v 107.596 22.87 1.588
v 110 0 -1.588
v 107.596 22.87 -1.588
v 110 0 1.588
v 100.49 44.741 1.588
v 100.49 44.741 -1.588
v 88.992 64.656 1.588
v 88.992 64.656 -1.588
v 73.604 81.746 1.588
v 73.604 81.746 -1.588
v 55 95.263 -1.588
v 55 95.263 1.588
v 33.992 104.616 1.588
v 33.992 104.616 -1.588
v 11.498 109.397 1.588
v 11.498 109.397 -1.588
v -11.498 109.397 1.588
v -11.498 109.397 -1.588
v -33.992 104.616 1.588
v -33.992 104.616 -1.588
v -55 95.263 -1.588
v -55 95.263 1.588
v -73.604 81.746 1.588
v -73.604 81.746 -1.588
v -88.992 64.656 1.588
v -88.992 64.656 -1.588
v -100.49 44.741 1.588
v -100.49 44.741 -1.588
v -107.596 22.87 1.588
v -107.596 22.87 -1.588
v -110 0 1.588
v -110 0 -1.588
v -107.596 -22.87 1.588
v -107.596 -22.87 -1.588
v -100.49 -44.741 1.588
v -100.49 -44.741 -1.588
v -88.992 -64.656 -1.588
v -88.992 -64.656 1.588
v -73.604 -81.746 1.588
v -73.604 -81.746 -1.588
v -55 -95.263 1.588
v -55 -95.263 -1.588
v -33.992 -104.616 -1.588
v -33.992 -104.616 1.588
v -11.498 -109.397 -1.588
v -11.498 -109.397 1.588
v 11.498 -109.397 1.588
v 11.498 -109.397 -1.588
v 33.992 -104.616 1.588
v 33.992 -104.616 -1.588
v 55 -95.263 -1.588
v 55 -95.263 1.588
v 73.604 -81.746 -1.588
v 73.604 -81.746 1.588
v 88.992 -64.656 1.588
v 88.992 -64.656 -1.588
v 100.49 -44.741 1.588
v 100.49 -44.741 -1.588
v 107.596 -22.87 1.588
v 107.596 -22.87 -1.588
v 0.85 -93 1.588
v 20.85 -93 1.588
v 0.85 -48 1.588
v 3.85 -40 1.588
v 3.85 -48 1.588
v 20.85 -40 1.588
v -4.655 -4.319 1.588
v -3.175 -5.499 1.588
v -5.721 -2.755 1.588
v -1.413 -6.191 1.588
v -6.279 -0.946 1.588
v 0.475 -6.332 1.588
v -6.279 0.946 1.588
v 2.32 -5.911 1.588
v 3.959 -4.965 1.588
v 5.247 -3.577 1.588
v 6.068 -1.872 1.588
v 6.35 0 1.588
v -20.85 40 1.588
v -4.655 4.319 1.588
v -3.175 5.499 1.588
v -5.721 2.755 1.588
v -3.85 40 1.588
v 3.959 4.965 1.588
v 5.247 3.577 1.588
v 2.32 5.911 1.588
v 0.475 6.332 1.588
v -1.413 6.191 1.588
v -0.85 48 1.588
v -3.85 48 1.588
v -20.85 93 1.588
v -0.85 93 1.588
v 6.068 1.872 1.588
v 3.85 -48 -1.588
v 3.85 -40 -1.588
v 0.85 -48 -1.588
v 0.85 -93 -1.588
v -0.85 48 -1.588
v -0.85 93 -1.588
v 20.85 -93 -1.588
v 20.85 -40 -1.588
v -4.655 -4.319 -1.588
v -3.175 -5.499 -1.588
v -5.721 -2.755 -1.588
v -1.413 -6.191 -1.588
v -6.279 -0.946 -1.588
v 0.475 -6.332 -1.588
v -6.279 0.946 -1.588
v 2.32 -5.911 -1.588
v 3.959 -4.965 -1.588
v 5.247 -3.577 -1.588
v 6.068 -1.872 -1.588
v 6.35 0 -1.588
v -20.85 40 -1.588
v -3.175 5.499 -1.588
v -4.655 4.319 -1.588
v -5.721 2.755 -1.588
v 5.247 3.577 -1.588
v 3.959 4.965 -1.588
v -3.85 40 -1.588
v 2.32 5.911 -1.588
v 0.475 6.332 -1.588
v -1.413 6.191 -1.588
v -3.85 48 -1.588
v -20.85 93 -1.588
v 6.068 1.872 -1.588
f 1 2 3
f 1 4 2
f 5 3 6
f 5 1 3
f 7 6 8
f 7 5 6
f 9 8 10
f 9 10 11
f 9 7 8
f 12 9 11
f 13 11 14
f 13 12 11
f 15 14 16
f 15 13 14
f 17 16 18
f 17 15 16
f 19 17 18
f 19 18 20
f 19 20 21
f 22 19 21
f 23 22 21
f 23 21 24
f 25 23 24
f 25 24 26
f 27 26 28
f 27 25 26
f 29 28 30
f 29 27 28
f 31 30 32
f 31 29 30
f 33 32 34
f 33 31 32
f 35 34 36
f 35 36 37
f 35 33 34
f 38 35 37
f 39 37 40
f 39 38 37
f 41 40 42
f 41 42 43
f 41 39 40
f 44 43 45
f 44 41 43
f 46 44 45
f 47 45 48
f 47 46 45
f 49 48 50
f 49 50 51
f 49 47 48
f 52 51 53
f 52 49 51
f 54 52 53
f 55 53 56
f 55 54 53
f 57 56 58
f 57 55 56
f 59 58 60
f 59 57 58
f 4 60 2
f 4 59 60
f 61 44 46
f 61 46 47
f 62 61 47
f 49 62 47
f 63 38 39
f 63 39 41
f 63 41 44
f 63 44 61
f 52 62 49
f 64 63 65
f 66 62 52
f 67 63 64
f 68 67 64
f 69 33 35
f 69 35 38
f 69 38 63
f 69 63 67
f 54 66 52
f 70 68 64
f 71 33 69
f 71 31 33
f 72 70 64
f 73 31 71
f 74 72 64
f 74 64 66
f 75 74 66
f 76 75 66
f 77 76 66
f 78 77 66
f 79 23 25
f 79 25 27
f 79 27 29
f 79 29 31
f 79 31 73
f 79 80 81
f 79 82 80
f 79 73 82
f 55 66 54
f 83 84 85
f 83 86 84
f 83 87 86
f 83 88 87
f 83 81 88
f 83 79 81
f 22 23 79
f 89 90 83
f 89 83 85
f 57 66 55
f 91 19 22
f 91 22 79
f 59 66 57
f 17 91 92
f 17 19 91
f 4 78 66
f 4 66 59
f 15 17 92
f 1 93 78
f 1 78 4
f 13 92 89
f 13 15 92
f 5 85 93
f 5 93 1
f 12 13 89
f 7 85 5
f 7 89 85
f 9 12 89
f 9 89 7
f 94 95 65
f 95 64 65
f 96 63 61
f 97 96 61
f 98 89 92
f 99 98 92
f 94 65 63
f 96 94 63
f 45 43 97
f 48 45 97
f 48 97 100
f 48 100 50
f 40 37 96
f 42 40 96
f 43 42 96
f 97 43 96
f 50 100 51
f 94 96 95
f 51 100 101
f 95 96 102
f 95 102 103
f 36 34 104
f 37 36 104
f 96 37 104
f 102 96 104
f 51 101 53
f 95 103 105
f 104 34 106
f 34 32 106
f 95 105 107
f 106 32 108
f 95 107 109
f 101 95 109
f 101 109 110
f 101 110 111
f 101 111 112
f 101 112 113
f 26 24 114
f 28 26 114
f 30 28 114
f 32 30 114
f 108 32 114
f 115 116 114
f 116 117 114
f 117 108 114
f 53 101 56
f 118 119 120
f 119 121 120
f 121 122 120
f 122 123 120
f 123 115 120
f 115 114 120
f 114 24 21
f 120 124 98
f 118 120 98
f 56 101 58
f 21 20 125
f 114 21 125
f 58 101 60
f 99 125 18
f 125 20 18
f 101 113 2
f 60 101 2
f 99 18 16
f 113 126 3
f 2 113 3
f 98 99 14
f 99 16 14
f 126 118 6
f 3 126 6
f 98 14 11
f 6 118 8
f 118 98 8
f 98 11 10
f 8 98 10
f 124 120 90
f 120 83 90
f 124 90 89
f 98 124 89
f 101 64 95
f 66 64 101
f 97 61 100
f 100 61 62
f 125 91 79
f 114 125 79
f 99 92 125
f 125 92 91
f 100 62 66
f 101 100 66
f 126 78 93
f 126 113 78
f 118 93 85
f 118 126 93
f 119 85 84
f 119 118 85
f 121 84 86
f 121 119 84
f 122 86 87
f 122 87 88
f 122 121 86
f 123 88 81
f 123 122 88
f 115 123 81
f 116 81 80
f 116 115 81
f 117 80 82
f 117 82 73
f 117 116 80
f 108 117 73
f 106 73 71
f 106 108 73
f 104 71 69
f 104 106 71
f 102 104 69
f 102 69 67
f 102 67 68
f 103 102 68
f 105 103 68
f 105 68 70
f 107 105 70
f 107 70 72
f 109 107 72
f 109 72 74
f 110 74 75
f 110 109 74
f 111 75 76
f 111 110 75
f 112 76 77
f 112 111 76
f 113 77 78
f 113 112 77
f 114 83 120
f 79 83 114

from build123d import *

# Parameters (mm, degrees)
SKETCH1_R           = 110
SKETCH1_R_2         = 6.35
BOSS_EXTRUDE1_DEPTH = 1.5875


with BuildPart() as part:
    # Sketch1 → Boss-Extrude1 (new body, symmetric)
    with BuildSketch(Plane.XY):
        Circle(SKETCH1_R)
        Circle(SKETCH1_R_2, mode=Mode.SUBTRACT)
        Polygon((-6.35, 40), (-3.85, 40), (-3.85, 48), (-0.85, 48), (-0.85, 93), (-20.85, 93), (-20.85, 40), (-18.35, 40), align=None, mode=Mode.SUBTRACT)
        Polygon((6.35, -40), (3.85, -40), (3.85, -48), (0.85, -48), (0.85, -93), (20.85, -93), (20.85, -40), (18.35, -40), align=None, mode=Mode.SUBTRACT)
    extrude(amount=BOSS_EXTRUDE1_DEPTH, both=True)


solid = part.part
